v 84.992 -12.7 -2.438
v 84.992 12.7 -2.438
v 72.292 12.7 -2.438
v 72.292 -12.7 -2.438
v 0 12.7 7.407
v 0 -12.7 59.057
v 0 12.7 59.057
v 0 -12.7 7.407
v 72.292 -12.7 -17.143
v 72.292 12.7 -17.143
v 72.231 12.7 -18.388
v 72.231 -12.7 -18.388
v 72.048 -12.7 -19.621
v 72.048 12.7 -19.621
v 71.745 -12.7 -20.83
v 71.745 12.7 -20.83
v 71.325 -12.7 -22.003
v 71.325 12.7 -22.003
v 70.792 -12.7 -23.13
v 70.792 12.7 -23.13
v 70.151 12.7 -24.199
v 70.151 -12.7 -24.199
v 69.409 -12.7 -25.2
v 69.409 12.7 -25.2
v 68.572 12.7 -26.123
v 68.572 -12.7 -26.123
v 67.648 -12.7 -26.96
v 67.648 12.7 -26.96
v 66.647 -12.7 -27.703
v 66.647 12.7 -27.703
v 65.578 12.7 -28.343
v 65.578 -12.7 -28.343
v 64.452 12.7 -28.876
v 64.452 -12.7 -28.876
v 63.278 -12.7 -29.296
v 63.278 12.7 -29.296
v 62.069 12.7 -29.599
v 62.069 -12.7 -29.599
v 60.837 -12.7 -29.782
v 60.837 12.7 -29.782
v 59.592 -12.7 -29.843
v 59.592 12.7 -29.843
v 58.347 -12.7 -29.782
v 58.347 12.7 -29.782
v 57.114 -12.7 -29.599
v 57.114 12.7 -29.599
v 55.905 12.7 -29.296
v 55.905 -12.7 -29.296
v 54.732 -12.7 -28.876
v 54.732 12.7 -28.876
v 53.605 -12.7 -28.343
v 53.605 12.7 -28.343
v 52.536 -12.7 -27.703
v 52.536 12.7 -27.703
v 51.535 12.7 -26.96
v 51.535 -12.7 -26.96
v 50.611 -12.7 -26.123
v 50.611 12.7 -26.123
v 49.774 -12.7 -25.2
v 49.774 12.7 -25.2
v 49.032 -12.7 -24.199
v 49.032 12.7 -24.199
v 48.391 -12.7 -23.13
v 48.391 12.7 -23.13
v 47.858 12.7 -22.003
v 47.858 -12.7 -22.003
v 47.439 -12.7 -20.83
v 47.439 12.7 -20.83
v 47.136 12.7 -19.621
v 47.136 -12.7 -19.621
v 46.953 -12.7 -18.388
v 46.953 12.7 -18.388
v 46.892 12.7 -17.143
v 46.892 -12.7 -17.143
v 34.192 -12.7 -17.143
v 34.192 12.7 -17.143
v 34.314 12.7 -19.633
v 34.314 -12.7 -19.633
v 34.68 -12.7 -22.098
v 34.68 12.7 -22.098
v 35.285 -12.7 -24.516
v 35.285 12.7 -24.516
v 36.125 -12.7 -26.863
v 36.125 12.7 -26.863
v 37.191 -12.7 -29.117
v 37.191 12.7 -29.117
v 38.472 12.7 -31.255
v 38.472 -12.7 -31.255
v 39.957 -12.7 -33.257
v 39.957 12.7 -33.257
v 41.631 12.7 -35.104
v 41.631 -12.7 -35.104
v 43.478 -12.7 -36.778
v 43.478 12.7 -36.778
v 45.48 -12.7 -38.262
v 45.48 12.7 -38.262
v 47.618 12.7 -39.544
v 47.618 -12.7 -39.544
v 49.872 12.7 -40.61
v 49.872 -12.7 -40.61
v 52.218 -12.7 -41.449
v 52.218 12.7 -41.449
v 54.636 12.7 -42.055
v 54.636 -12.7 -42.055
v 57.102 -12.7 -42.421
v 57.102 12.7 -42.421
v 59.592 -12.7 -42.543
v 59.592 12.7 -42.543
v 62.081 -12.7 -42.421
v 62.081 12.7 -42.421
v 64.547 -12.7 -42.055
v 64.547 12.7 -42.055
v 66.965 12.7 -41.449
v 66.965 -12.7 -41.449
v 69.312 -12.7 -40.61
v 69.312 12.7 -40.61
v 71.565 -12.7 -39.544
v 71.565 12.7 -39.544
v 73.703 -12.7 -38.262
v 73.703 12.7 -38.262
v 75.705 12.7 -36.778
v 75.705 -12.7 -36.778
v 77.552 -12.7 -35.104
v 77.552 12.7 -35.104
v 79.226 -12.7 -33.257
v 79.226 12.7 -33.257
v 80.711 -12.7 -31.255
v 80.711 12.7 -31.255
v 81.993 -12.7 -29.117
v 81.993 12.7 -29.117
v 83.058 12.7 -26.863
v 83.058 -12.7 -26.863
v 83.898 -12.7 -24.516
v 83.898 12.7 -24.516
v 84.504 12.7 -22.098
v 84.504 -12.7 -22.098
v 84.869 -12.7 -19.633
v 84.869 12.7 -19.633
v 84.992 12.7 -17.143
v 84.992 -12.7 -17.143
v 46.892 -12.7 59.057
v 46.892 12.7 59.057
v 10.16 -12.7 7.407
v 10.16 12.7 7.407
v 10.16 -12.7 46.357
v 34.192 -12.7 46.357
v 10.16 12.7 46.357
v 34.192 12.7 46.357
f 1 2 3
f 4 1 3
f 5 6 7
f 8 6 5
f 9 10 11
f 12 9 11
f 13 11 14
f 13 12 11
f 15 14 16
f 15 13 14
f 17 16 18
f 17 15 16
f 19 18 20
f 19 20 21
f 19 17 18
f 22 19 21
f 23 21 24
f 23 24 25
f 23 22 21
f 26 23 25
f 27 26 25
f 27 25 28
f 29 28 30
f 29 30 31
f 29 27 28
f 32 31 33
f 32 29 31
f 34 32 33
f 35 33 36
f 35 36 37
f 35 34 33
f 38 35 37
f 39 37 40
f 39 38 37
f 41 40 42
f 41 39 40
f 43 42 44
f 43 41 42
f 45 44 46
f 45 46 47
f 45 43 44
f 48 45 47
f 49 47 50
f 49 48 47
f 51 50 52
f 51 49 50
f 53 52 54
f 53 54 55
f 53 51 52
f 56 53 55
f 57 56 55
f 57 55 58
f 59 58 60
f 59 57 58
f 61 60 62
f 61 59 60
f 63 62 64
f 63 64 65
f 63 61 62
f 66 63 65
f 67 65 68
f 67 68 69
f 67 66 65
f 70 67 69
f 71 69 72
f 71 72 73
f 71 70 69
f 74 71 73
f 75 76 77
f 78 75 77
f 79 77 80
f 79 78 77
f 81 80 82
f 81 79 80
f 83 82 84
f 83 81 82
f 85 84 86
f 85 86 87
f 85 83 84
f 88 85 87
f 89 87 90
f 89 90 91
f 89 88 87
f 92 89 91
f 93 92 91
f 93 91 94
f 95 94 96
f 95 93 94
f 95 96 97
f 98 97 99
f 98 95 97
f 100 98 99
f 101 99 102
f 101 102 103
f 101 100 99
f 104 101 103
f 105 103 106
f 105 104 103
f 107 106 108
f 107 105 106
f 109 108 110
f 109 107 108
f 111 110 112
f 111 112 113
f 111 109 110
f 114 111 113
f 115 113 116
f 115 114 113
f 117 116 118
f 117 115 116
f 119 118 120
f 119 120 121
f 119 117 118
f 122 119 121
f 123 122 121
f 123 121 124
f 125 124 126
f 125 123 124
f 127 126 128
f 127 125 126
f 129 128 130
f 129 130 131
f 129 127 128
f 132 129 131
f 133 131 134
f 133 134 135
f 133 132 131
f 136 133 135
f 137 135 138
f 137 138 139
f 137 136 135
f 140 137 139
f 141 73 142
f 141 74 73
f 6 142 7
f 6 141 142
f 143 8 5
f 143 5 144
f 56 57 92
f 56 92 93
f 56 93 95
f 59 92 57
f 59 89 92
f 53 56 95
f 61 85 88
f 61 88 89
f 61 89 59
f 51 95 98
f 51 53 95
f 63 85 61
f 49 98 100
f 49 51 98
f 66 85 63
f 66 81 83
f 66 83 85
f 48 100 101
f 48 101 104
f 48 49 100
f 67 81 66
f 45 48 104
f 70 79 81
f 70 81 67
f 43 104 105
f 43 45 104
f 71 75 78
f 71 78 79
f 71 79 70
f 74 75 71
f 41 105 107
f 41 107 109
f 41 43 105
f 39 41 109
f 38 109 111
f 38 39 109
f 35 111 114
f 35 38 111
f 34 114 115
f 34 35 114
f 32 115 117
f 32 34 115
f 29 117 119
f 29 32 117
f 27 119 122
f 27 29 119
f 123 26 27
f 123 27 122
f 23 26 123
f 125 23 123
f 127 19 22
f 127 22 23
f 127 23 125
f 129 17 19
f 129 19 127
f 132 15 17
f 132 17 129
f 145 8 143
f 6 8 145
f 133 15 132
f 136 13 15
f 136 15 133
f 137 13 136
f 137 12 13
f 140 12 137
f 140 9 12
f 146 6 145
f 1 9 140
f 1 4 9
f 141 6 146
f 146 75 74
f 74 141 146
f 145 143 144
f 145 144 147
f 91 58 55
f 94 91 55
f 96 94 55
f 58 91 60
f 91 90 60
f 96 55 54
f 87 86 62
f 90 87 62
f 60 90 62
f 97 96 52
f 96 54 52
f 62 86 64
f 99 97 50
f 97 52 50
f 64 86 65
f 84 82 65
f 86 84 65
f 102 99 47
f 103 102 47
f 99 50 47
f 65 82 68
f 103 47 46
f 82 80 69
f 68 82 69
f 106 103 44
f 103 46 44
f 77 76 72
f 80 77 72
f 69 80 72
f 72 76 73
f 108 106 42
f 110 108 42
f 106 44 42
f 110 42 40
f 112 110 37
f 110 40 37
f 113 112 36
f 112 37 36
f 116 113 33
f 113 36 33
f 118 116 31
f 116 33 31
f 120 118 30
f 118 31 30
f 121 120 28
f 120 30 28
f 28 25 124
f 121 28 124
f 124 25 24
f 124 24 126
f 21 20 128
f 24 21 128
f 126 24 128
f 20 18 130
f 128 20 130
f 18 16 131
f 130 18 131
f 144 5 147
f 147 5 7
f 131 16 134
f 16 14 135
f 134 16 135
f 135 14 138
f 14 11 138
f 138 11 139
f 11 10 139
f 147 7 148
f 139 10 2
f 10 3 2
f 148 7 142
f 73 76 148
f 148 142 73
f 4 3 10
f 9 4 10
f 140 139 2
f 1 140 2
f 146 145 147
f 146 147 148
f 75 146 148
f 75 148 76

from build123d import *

# Parameters (mm, degrees)
F1_DEPTH = 12.7


with BuildPart() as f1:
    # F0 (on Front) → F1 (new body, symmetric)
    with BuildSketch(Plane.XZ):
        with BuildLine():
            Line((46.891703, 59.056909), (0, 59.056909))
            Line((0, 59.056909), (0, 7.407219))
            Line((0, 7.407219), (10.16, 7.407219))
            Line((10.16, 7.407219), (10.16, 46.356909))
            Line((10.16, 46.356909), (34.191703, 46.356909))
            Line((34.191703, 46.356909), (34.191703, -17.143091))
            ThreePointArc((34.191703, -17.143091), (59.591703, -42.543091), (84.991703, -17.143091))
            Line((84.991703, -17.143091), (84.991703, -2.438421))
            Line((84.991703, -2.438421), (72.291703, -2.438421))
            Line((72.291703, -2.438421), (72.291703, -17.143091))
            ThreePointArc((72.291703, -17.143091), (59.591703, -29.843091), (46.891703, -17.143091))
            Line((46.891703, -17.143091), (46.891703, 59.056909))
        make_face()
    extrude(amount=F1_DEPTH, both=True)


solid = f1.part
